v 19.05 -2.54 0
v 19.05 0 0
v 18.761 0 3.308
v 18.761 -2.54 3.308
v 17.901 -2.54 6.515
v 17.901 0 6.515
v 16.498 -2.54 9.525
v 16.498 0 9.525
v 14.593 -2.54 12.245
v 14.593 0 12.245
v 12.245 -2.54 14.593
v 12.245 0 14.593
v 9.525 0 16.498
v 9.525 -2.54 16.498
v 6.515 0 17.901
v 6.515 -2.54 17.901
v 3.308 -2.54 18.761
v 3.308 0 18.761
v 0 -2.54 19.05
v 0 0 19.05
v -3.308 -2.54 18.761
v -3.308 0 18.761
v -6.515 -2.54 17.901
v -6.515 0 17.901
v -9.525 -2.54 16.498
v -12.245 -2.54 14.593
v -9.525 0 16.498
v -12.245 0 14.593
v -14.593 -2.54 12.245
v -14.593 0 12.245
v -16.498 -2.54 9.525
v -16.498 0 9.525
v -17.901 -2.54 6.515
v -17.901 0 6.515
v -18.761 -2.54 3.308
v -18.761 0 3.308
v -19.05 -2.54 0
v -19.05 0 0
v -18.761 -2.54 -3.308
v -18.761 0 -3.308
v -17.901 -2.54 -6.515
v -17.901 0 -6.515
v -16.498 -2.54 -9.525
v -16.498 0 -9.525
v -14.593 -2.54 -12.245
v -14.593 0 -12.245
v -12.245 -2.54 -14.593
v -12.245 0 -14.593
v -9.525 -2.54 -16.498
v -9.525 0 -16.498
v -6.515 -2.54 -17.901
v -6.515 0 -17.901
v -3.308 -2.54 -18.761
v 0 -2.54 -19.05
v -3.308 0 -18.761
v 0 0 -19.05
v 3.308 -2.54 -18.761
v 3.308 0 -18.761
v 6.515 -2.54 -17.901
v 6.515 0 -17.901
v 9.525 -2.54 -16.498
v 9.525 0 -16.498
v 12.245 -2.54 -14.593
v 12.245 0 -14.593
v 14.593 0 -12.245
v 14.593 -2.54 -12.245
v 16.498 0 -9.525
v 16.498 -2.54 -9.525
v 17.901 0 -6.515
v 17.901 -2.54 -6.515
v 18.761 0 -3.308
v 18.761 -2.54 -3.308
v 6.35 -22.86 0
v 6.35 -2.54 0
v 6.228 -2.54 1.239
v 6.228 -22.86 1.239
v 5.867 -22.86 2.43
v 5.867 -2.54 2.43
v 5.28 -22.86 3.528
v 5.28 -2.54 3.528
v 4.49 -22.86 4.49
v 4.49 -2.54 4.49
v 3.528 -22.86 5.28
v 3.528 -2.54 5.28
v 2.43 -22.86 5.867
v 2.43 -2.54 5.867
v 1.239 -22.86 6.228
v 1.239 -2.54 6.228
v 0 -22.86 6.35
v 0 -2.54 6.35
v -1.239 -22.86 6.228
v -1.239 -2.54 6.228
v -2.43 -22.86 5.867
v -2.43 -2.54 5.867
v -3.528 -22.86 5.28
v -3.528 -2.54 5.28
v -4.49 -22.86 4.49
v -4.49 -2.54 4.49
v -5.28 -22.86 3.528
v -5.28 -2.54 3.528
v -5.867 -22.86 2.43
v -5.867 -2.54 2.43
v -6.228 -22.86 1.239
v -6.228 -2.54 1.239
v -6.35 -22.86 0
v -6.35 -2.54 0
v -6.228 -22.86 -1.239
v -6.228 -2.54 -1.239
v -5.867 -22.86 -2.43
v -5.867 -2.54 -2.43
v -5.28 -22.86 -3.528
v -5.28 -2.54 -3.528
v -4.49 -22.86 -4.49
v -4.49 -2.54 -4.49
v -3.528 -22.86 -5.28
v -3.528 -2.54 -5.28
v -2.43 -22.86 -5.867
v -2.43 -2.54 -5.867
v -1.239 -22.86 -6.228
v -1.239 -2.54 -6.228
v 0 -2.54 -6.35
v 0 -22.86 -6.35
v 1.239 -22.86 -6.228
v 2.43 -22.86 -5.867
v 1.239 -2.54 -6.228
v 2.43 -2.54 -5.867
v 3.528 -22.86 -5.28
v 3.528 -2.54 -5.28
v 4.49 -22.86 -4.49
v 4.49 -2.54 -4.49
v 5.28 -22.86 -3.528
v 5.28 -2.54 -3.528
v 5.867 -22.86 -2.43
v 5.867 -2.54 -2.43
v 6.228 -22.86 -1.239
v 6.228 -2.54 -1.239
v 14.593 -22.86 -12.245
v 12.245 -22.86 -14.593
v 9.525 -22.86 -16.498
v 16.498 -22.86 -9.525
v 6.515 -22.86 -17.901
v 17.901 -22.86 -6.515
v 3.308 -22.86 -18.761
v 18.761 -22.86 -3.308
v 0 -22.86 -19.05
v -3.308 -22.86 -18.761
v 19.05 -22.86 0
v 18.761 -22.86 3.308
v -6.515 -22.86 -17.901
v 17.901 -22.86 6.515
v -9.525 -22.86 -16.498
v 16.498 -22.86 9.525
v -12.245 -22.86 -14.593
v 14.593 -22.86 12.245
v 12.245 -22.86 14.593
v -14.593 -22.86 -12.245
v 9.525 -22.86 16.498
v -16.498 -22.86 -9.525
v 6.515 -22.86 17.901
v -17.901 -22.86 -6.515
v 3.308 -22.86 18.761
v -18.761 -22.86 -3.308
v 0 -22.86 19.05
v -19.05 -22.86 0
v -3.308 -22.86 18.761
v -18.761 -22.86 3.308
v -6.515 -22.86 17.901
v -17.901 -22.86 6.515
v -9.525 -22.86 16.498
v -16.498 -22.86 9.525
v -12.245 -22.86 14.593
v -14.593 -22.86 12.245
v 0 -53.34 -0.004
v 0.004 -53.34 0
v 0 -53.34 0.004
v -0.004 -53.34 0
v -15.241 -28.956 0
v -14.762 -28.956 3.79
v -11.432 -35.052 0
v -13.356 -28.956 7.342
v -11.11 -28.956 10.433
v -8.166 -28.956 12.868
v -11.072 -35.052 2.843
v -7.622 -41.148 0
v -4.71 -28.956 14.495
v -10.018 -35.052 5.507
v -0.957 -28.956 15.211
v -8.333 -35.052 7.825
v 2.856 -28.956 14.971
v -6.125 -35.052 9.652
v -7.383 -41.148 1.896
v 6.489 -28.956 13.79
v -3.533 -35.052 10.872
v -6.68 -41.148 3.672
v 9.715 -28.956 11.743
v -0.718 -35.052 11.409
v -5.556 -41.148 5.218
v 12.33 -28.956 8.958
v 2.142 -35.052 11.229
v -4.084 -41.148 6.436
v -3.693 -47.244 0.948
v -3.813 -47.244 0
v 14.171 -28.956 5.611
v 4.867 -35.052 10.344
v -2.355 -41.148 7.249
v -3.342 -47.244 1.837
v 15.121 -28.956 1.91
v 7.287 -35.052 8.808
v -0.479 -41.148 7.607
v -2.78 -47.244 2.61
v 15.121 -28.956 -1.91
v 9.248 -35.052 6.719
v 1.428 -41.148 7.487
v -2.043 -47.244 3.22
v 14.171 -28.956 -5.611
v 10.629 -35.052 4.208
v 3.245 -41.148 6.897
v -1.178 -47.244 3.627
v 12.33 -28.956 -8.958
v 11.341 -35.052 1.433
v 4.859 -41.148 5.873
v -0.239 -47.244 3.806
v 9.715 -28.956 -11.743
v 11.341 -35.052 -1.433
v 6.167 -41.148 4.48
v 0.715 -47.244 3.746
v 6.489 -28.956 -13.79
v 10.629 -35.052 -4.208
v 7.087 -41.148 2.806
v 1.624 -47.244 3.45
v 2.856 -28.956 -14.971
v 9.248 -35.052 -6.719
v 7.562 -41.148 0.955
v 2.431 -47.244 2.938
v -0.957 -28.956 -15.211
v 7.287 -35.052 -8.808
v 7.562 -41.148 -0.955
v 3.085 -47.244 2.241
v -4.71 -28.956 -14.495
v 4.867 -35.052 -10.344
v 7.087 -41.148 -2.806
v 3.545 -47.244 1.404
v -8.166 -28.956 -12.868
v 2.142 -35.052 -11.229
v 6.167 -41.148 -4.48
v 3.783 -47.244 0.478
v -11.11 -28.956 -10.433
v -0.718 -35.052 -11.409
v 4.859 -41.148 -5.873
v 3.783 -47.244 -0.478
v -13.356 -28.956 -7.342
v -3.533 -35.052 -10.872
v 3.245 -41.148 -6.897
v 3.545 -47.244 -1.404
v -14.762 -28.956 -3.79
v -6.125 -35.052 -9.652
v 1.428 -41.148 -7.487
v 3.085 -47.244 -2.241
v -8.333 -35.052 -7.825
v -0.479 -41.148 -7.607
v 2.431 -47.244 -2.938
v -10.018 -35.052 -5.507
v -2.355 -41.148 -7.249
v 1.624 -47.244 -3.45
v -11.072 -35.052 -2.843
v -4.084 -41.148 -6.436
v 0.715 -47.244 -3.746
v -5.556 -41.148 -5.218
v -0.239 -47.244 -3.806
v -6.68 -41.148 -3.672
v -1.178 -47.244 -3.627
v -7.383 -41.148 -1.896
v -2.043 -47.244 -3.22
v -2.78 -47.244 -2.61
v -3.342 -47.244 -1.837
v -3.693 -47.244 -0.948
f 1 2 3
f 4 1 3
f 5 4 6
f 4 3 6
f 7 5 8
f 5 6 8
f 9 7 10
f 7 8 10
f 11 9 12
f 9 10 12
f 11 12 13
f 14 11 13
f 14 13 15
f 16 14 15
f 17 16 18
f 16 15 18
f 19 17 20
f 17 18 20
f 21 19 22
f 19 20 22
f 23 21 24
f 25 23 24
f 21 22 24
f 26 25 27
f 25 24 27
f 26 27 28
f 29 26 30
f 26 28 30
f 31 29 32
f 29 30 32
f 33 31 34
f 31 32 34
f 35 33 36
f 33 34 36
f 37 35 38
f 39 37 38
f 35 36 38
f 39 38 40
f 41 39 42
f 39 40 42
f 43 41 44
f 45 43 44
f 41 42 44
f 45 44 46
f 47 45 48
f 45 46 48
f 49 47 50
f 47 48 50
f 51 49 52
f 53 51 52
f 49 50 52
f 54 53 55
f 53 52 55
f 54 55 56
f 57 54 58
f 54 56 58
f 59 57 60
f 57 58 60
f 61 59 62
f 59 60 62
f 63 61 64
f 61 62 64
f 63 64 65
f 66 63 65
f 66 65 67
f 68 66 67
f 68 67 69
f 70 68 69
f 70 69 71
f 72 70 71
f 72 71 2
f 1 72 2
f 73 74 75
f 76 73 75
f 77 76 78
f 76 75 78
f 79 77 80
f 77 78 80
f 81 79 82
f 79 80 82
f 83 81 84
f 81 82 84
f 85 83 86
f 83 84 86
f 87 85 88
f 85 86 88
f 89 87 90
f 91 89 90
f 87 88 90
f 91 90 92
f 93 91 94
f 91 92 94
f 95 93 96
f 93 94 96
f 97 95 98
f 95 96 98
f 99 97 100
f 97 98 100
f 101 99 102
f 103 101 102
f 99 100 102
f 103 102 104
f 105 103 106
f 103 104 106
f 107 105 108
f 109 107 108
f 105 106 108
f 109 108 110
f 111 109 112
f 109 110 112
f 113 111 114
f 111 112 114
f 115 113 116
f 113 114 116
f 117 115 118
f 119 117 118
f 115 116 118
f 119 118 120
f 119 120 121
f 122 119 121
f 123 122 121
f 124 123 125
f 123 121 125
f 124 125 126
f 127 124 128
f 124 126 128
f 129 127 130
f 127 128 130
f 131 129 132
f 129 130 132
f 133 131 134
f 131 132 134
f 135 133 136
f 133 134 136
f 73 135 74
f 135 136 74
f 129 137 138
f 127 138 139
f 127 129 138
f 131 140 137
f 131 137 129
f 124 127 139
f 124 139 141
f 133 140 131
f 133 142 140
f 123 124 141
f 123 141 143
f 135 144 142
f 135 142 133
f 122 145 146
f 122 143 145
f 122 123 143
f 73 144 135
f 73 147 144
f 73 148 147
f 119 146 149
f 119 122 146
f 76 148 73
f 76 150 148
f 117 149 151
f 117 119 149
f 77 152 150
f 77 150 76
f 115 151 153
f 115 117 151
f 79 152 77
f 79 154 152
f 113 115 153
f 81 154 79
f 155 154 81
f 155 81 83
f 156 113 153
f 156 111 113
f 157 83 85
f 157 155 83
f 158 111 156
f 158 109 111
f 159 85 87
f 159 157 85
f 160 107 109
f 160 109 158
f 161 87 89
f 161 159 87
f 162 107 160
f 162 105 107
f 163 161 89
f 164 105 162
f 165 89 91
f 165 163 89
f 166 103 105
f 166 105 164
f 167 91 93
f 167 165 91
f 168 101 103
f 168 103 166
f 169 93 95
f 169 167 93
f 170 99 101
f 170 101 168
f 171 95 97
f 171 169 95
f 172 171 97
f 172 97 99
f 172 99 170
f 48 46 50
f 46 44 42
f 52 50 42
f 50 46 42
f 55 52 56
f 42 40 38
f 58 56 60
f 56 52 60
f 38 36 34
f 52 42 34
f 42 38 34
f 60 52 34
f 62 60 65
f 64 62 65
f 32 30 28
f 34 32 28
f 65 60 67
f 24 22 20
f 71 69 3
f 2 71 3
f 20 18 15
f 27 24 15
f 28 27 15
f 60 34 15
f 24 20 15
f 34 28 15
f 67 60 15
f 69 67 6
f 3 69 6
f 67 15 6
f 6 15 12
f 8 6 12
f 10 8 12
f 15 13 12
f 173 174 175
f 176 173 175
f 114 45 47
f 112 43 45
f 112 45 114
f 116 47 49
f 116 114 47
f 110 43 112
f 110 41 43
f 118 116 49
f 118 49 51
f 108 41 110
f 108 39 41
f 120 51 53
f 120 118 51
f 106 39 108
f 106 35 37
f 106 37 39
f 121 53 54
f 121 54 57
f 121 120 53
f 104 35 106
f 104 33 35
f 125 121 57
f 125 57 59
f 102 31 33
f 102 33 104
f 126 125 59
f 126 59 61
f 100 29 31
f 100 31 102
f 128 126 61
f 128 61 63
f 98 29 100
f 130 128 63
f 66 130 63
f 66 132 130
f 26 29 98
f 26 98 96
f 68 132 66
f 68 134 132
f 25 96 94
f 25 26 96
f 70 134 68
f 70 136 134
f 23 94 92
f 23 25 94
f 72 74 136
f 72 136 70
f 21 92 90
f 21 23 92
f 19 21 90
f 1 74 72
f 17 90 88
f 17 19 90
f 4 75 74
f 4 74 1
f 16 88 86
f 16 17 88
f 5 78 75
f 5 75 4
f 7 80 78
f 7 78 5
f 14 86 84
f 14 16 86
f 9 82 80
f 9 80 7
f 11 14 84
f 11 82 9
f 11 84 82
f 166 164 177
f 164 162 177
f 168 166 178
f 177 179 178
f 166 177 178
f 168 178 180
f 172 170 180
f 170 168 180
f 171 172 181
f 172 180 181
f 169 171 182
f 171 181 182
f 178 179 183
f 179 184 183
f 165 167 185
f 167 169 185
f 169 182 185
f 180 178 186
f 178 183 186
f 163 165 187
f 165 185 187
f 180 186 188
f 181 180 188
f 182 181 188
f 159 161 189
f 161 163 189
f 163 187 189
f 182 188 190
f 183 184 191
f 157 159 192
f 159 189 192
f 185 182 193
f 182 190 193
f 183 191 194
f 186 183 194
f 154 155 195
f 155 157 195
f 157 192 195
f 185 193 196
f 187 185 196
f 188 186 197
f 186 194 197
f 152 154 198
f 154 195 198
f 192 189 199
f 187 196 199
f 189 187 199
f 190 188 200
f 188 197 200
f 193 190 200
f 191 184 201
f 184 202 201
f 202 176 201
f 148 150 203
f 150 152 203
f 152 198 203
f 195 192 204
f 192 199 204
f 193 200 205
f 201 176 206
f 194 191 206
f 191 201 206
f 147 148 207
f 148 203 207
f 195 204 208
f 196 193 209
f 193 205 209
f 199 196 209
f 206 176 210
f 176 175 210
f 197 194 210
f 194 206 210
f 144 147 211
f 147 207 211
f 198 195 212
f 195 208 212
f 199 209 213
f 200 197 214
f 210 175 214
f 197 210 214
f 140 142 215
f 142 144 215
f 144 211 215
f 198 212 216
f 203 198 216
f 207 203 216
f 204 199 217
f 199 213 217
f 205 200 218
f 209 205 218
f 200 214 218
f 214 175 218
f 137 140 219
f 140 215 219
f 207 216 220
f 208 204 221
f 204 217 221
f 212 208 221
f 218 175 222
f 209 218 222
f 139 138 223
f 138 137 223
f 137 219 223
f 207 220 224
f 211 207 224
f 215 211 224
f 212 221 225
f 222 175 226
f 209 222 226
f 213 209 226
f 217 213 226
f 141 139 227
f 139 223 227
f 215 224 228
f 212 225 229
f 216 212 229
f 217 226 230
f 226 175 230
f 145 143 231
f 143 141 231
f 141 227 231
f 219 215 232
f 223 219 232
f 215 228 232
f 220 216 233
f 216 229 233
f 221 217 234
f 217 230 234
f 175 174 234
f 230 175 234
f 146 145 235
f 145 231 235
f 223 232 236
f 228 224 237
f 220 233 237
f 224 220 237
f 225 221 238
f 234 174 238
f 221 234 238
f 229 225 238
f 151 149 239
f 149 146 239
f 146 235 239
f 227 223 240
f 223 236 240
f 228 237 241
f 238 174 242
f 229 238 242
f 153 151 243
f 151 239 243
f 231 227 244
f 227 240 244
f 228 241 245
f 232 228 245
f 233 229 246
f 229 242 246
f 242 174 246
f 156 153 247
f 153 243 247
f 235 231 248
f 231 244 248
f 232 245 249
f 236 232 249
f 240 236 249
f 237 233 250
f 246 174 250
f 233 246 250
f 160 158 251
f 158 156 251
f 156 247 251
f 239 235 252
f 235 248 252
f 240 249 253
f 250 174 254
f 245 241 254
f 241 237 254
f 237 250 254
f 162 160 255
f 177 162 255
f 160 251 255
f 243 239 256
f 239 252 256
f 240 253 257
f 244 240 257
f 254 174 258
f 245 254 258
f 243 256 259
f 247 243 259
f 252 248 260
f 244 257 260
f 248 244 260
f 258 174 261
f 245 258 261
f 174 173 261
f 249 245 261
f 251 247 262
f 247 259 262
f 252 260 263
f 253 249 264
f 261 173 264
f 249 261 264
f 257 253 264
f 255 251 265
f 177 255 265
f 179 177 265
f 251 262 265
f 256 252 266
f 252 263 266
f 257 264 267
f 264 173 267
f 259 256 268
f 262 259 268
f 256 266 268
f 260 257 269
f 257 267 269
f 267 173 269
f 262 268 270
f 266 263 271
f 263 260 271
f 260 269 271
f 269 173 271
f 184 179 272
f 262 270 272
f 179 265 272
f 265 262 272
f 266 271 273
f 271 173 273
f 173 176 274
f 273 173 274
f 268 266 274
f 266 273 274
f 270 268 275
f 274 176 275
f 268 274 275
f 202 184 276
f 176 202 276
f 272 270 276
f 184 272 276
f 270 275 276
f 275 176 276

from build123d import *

# Parameters (mm, degrees)
F0_R     = 19.05
F1_DEPTH = 2.54
F2_R     = 6.35
F3_DEPTH = 20.32
F5_R     = 19.05
F6_DEPTH = 30.48
F6_TAPER = 32


with BuildPart() as f1:
    # F0 (on Front) → F1 (new body)
    with BuildSketch(Plane.XZ):
        Circle(F0_R)
    extrude(amount=F1_DEPTH)

    # F2 (on face) → F3 (join)
    with BuildSketch(Plane.XZ.offset(2.54)):
        Circle(F2_R)
    extrude(amount=F3_DEPTH)

    # F5 (on offset) → F6 (join)
    with BuildSketch(Plane(origin=(0, -22.86, 0), x_dir=(-1, 0, 0), z_dir=(0, 1, 0))):
        Circle(F5_R)
    extrude(amount=-F6_DEPTH, taper=F6_TAPER)


solid = f1.part
